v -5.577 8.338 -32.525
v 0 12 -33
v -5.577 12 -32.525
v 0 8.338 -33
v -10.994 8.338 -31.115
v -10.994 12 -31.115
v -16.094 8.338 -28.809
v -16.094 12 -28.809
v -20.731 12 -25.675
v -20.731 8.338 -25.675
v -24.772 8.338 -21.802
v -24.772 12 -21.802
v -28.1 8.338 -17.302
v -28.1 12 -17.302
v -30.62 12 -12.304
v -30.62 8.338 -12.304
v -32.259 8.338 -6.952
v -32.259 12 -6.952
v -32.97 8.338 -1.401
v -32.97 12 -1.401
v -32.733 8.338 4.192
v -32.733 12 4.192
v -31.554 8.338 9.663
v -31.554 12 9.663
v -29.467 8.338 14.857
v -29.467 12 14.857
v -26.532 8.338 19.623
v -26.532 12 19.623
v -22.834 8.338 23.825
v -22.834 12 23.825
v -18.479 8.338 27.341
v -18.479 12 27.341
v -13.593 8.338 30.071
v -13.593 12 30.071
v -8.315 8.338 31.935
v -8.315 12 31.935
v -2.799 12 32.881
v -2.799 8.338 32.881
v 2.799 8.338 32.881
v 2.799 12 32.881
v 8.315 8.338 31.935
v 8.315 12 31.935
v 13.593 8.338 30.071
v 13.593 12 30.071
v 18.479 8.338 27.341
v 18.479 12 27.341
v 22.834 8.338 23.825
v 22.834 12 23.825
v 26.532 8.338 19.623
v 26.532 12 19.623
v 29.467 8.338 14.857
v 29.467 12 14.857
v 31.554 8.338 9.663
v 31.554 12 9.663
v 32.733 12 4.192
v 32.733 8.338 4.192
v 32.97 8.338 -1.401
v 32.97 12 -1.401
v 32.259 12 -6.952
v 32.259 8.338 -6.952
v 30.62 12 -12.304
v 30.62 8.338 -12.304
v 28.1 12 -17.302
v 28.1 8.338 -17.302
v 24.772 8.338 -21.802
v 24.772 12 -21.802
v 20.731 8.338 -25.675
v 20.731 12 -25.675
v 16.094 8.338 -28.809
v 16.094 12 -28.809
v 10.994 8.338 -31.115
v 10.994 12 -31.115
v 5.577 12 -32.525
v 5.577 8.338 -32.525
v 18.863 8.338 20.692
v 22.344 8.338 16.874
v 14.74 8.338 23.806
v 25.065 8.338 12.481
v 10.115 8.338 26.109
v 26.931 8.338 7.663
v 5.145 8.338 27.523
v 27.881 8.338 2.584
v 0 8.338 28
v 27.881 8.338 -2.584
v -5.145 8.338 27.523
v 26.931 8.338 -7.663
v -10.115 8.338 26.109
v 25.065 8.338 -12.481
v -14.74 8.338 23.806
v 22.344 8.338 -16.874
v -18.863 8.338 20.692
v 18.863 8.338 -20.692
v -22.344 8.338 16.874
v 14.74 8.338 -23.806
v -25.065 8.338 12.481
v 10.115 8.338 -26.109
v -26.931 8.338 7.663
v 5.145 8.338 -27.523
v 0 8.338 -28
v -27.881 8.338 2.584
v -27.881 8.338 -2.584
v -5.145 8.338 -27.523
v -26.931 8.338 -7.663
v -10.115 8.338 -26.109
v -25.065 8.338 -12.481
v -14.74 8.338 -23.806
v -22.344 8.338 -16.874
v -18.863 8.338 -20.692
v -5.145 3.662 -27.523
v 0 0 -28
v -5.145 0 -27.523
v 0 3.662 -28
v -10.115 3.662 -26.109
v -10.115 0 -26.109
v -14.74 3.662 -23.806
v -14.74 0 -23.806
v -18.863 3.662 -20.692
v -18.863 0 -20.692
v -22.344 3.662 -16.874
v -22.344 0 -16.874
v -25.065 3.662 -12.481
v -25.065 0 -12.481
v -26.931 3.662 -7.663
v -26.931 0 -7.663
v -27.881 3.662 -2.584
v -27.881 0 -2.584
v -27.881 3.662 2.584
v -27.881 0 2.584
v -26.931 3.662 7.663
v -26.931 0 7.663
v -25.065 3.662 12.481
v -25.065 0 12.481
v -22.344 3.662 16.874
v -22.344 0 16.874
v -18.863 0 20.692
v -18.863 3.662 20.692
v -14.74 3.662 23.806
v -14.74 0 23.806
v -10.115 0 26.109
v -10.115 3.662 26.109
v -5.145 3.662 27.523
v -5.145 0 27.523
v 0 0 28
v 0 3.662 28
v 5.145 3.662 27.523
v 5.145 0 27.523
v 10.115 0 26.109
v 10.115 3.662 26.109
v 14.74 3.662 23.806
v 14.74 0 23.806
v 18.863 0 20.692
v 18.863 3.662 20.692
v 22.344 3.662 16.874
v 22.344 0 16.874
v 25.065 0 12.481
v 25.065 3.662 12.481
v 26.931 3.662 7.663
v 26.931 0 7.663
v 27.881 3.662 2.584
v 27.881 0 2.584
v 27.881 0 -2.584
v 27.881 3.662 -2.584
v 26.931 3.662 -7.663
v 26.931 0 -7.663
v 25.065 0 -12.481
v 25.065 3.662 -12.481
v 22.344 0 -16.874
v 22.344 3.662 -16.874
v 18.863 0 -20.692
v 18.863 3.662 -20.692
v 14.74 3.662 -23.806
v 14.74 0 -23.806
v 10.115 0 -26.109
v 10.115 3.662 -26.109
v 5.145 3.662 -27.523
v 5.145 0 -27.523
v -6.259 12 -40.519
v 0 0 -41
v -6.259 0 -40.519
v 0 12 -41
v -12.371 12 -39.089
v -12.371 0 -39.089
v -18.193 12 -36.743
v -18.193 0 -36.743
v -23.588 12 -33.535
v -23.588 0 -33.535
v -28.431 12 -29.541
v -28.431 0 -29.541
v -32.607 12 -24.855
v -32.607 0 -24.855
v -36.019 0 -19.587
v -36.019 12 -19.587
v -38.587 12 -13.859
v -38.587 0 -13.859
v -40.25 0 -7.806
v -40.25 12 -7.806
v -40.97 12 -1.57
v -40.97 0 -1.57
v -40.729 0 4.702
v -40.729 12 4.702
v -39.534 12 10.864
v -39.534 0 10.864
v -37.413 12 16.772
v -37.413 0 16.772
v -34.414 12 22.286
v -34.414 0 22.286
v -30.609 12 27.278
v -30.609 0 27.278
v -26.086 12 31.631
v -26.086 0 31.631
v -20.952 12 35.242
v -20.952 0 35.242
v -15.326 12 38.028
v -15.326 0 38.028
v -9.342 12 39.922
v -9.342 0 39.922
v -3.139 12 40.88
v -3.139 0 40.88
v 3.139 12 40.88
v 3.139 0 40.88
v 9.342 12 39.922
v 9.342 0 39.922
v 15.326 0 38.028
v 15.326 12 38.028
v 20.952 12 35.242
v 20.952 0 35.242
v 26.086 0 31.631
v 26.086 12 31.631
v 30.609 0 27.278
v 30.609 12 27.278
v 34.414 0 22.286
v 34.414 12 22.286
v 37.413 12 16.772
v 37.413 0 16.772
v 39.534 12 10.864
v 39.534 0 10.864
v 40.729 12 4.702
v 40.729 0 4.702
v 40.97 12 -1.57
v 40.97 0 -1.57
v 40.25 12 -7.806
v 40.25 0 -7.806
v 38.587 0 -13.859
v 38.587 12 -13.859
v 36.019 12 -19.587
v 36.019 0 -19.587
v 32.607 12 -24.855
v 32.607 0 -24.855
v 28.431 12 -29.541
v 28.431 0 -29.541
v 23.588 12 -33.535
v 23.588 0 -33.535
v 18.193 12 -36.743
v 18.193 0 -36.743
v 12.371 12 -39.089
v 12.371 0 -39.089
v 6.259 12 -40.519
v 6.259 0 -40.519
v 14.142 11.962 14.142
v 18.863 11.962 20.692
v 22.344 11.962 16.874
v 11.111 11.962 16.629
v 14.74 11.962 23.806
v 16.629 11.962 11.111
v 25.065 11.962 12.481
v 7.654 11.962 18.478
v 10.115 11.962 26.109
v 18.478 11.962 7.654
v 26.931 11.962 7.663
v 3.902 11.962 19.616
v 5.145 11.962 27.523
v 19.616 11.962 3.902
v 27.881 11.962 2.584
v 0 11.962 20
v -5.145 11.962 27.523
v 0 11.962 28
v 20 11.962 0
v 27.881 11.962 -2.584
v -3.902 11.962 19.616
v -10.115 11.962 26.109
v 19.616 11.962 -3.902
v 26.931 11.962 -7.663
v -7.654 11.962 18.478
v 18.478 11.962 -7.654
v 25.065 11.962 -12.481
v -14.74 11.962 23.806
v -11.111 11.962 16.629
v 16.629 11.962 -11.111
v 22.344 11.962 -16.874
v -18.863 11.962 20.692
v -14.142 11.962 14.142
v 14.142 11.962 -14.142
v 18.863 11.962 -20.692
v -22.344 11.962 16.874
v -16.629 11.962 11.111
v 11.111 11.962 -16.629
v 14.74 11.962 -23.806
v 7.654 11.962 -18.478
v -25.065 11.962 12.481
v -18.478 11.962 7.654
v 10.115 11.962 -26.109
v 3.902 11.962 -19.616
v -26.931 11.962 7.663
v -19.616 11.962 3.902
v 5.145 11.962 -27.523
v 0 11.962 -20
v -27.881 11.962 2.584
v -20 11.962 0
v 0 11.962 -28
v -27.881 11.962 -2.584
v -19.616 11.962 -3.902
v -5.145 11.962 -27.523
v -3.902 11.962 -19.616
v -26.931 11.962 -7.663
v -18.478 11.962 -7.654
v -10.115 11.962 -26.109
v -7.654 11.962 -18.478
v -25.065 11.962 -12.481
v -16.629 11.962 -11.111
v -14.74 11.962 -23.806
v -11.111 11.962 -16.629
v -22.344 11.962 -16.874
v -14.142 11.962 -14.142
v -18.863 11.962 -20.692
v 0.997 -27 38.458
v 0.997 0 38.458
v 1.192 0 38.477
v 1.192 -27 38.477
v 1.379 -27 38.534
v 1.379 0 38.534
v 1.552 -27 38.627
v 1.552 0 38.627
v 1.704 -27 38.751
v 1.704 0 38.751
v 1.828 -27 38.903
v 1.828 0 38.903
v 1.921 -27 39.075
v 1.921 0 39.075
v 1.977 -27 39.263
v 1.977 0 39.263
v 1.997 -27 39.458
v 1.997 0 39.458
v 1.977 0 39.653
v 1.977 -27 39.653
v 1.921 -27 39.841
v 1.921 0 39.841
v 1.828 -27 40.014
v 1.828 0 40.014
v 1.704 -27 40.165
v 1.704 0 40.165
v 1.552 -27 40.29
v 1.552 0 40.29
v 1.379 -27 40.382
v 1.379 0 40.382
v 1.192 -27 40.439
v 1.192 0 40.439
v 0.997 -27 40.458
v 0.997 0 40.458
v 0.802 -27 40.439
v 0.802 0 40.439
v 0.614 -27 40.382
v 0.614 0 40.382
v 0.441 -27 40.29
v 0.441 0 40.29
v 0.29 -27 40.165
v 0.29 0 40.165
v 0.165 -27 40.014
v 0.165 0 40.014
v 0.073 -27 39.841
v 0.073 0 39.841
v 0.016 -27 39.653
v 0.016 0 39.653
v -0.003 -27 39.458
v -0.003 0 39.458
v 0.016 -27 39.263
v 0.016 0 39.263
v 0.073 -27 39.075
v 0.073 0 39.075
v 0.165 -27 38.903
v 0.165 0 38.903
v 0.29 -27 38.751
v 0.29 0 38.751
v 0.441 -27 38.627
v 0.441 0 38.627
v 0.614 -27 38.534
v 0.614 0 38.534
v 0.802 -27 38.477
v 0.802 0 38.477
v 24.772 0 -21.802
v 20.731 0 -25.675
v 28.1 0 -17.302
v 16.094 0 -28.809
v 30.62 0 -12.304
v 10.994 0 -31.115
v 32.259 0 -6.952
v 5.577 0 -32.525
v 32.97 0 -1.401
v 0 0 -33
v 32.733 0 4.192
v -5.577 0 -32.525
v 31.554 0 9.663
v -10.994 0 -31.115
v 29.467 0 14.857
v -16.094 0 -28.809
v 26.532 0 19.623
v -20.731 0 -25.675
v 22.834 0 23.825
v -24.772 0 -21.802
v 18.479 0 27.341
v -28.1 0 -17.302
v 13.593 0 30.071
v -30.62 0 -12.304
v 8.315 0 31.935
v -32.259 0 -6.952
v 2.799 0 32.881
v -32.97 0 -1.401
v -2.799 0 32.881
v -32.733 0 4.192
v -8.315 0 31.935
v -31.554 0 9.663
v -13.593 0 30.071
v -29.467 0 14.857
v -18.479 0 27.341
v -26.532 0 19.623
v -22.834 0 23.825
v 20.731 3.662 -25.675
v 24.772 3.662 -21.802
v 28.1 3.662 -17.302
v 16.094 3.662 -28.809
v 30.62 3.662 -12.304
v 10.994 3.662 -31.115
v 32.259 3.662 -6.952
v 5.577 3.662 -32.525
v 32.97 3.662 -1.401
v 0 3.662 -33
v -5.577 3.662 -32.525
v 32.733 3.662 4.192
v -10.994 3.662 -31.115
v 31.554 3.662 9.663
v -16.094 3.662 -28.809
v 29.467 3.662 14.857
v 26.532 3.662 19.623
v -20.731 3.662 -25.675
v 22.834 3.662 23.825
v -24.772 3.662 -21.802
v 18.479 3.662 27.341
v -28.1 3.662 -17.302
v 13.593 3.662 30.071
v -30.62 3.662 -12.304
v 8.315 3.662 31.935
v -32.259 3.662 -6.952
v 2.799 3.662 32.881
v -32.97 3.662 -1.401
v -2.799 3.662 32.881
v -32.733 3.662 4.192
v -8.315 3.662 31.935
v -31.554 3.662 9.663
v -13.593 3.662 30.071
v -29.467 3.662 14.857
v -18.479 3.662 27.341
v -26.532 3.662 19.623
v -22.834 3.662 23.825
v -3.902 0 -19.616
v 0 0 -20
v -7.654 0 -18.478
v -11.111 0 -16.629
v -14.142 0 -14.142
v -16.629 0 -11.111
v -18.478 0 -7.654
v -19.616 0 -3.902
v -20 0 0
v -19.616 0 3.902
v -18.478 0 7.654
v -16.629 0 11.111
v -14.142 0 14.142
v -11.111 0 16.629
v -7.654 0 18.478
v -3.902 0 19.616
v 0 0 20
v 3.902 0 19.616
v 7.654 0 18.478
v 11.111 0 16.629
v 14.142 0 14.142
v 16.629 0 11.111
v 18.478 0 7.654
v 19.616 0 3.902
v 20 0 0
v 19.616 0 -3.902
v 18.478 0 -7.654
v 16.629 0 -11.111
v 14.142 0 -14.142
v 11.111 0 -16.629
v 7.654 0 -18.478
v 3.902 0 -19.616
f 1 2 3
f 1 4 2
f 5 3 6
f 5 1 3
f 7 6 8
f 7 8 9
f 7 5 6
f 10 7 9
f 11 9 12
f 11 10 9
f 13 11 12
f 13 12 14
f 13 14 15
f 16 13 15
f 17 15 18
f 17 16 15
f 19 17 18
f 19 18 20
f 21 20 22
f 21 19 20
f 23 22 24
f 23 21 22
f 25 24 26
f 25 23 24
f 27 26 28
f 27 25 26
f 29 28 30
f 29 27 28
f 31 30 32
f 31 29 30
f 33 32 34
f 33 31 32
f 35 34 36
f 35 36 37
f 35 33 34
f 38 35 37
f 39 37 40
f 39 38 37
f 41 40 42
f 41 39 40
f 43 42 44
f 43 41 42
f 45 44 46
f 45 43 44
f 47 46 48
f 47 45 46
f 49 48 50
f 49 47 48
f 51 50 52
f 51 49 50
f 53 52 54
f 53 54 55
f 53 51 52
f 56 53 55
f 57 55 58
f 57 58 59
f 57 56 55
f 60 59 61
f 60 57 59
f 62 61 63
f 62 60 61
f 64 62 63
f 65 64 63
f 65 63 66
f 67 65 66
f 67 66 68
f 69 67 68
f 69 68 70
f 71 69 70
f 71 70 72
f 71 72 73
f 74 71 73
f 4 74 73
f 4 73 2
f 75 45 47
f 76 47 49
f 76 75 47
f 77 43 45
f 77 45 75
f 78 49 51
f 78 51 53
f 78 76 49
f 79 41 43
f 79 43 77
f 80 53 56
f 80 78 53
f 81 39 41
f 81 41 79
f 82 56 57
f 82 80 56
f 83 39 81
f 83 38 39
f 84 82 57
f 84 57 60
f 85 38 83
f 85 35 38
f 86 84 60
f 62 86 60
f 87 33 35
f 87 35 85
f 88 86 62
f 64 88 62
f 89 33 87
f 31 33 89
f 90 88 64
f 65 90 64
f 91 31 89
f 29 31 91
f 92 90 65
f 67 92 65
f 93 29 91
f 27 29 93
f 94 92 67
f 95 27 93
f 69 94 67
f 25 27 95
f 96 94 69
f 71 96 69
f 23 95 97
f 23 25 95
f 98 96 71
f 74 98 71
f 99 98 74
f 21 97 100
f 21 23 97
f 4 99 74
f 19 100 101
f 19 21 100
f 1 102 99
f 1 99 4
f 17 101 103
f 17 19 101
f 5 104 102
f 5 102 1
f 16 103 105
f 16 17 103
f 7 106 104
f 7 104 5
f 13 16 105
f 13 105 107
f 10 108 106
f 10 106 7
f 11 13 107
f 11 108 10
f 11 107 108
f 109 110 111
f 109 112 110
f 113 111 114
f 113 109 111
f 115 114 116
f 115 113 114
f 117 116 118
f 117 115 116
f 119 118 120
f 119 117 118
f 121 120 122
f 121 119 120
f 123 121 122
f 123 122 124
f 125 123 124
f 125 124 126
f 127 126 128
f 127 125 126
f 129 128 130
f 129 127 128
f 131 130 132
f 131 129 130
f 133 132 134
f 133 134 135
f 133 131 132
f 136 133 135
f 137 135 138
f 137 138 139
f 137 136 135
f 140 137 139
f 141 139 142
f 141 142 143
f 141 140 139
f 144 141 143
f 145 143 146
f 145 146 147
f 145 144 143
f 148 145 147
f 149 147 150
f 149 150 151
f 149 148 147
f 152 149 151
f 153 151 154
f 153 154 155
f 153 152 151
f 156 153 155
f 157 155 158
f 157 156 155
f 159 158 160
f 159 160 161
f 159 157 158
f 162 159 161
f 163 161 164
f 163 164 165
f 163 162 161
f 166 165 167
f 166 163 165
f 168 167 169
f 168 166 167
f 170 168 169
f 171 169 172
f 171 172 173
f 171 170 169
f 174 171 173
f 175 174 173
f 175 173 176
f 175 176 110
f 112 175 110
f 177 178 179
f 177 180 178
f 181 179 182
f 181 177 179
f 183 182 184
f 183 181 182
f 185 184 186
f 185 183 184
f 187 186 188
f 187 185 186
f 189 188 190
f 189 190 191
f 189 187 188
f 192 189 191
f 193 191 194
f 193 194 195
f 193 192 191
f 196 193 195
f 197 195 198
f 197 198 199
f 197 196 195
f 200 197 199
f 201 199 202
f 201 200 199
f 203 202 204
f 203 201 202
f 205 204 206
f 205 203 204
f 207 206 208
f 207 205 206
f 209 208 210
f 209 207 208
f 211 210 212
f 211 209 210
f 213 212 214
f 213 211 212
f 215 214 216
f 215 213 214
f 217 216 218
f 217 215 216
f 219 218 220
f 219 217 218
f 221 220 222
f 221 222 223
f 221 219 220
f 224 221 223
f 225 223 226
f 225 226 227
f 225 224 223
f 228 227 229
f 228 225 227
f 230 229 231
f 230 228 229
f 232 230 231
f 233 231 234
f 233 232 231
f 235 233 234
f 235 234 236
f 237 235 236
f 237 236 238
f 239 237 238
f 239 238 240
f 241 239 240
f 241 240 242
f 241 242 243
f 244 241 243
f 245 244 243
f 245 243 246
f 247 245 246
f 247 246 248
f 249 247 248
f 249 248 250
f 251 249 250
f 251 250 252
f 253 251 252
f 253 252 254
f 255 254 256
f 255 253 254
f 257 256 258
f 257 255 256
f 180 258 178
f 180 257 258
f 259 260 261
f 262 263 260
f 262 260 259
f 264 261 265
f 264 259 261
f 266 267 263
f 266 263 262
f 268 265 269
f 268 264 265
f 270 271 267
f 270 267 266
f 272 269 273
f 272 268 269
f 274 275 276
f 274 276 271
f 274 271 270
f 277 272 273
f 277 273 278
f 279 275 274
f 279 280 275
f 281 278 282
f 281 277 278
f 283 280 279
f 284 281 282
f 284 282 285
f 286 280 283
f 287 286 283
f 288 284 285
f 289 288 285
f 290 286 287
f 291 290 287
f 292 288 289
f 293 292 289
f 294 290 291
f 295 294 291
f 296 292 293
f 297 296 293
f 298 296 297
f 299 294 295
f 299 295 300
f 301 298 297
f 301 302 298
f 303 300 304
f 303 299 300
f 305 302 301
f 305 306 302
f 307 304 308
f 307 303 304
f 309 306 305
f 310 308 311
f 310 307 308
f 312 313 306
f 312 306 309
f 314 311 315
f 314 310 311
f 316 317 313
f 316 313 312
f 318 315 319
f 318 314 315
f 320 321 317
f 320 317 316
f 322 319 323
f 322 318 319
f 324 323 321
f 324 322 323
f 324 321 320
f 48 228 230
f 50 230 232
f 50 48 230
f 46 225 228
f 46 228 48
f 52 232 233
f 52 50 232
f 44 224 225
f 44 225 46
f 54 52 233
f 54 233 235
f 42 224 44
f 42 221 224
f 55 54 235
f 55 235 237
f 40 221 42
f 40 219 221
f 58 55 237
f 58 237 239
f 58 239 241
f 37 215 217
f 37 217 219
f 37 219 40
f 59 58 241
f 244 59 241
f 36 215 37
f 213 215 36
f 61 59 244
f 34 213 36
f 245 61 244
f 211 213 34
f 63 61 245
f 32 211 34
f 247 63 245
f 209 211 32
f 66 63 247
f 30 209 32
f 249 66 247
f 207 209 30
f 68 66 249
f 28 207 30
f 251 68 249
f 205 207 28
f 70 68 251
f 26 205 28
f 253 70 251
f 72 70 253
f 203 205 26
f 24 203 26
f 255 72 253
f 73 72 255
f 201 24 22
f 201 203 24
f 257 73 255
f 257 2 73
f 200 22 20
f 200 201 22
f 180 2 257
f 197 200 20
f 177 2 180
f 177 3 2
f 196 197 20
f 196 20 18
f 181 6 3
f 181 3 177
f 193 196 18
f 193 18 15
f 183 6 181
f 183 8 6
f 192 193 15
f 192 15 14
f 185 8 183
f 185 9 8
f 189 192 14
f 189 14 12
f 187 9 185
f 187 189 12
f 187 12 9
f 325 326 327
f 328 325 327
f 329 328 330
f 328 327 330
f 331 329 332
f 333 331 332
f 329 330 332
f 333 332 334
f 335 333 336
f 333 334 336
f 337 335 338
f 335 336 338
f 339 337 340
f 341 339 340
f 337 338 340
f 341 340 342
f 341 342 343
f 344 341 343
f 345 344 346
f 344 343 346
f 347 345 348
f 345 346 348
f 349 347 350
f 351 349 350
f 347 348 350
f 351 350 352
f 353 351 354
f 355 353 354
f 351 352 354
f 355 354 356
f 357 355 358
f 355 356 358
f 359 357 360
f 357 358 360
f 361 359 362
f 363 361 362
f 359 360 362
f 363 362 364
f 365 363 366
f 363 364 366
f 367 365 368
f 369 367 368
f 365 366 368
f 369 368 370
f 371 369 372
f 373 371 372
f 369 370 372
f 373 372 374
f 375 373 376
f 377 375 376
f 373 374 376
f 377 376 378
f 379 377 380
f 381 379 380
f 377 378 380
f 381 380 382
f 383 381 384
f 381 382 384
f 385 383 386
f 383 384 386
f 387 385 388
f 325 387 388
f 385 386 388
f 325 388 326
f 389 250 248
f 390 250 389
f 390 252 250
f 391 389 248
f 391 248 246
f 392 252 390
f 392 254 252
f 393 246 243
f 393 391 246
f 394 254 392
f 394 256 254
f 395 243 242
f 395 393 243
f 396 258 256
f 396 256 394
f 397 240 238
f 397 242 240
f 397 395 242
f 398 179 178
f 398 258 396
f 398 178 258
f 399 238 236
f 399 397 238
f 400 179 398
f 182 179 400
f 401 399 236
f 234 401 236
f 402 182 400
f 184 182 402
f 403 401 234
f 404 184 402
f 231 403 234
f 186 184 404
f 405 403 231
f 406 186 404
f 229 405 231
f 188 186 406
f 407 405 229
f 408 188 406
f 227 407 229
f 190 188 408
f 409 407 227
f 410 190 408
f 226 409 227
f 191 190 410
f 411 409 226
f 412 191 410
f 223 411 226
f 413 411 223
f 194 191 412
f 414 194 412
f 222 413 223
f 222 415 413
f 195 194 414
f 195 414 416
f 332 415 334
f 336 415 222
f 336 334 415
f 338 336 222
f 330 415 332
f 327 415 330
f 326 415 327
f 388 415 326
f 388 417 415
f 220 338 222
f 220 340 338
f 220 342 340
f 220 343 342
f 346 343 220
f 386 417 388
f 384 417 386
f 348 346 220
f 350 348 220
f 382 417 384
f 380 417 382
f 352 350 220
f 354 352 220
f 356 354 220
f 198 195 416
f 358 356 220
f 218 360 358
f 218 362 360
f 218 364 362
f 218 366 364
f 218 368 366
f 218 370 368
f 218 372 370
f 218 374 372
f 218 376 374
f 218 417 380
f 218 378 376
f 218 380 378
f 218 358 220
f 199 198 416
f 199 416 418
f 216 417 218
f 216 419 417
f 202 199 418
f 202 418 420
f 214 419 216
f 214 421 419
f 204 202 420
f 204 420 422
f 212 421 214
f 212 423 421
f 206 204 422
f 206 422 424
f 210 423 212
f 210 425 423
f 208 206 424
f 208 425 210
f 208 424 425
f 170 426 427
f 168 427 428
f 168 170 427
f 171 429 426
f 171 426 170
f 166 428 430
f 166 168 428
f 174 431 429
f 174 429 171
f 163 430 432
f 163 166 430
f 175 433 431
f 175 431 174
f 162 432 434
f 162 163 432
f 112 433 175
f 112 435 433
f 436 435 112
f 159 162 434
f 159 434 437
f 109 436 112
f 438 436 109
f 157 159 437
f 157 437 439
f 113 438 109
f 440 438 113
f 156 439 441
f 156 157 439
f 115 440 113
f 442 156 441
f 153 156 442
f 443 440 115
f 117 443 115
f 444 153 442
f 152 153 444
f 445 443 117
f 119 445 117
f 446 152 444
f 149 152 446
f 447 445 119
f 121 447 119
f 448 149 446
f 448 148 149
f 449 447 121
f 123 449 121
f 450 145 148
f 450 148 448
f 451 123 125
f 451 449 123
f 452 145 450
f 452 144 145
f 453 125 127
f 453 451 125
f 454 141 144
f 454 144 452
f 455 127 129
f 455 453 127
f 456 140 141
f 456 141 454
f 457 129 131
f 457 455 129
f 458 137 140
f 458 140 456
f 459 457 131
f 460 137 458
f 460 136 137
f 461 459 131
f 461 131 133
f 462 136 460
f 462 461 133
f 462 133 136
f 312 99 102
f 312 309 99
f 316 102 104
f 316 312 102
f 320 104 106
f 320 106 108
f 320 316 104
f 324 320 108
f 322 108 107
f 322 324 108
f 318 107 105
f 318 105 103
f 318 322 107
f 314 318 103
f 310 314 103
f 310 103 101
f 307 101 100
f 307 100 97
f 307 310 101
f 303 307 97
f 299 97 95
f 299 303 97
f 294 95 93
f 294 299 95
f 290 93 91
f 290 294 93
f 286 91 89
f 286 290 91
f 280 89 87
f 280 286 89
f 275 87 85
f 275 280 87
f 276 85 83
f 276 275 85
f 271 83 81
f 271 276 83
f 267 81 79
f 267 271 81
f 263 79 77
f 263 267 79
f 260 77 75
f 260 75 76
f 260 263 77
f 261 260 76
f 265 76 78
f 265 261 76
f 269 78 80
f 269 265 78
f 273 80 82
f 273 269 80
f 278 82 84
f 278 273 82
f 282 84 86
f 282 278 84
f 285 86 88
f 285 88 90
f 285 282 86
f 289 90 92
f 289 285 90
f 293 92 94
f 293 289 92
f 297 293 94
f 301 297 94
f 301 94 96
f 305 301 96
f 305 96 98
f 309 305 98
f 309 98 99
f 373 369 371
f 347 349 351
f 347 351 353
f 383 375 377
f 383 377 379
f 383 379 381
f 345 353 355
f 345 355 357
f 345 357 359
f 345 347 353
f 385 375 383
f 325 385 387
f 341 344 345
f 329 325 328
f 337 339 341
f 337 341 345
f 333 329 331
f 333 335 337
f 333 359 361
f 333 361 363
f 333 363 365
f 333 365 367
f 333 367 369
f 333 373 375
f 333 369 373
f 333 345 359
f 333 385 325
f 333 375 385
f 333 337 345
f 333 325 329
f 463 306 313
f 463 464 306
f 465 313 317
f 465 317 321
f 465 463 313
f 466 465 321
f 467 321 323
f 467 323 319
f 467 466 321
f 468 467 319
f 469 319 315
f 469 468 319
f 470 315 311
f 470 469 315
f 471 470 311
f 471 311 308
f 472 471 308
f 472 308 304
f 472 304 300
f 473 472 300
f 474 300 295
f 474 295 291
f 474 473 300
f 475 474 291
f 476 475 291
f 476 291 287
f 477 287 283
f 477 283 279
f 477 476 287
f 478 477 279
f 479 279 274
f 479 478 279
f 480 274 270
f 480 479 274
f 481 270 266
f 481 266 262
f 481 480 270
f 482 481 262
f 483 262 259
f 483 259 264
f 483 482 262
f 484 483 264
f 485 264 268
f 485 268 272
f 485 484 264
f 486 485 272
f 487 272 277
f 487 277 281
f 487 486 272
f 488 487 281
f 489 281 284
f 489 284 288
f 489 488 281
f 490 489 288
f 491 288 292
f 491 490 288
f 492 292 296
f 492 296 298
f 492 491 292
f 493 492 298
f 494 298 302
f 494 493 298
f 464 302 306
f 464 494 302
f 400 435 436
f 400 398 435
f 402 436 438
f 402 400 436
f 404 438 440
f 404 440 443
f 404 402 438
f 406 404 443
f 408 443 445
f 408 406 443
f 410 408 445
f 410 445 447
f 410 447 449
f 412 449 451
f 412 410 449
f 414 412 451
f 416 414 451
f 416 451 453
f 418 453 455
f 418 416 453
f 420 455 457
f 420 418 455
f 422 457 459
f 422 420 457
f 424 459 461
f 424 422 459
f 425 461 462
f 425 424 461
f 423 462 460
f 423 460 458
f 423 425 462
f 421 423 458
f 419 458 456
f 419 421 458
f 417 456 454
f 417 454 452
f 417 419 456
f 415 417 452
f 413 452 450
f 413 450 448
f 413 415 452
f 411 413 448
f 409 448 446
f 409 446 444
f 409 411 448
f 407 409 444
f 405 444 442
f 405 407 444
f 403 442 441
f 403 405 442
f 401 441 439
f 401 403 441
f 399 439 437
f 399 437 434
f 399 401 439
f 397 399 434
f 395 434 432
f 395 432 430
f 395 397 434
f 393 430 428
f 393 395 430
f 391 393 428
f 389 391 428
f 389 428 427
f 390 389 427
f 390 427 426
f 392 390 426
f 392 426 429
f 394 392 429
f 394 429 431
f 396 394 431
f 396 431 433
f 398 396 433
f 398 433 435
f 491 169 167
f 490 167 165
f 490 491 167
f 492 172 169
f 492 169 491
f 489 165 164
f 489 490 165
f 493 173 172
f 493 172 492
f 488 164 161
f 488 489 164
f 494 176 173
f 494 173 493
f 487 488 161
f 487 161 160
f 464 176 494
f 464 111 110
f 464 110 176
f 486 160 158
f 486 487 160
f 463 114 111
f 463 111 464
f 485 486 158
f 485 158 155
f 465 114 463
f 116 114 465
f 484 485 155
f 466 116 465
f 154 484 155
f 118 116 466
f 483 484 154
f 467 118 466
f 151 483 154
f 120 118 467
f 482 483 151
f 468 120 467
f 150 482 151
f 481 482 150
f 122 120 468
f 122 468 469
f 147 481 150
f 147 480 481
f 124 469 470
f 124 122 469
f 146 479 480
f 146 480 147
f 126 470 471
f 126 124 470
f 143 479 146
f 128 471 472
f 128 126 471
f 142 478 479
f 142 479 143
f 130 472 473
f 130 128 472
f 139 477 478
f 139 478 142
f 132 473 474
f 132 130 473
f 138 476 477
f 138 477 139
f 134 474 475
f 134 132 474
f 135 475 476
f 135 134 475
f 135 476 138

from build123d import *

# Parameters (mm, degrees)
SKETCH_2_R      = 1
EXTRUDE_1_DEPTH = 27


with BuildPart() as part:
    # 草图1 → 旋转1 (revolve)
    with BuildSketch(Plane.XY, mode=Mode.PRIVATE) as revolve_1_sk:
        Polygon((20, 0), (28, 0), (28, 3.662344451), (33, 3.662344451), (33, 0), (41, 0), (41, 12), (33, 12), (33, 8.337655549), (28, 8.337655549), (28, 11.96151904), (20, 11.96151904), align=None)
    revolve(revolve_1_sk.sketch.rotate(Axis((0, 0, 0), (0, 1, 0)), 90), axis=Axis((0, 0, 0), (0, 1, 0)))

    # 草图2 → 凸台-拉伸1 (add)
    with BuildSketch(Plane.XZ):
        with Locations(Location((0.996647287, 39.458172136, 0), (0, 0, 270))):
            Circle(SKETCH_2_R)
    extrude(amount=EXTRUDE_1_DEPTH)


solid = part.part
